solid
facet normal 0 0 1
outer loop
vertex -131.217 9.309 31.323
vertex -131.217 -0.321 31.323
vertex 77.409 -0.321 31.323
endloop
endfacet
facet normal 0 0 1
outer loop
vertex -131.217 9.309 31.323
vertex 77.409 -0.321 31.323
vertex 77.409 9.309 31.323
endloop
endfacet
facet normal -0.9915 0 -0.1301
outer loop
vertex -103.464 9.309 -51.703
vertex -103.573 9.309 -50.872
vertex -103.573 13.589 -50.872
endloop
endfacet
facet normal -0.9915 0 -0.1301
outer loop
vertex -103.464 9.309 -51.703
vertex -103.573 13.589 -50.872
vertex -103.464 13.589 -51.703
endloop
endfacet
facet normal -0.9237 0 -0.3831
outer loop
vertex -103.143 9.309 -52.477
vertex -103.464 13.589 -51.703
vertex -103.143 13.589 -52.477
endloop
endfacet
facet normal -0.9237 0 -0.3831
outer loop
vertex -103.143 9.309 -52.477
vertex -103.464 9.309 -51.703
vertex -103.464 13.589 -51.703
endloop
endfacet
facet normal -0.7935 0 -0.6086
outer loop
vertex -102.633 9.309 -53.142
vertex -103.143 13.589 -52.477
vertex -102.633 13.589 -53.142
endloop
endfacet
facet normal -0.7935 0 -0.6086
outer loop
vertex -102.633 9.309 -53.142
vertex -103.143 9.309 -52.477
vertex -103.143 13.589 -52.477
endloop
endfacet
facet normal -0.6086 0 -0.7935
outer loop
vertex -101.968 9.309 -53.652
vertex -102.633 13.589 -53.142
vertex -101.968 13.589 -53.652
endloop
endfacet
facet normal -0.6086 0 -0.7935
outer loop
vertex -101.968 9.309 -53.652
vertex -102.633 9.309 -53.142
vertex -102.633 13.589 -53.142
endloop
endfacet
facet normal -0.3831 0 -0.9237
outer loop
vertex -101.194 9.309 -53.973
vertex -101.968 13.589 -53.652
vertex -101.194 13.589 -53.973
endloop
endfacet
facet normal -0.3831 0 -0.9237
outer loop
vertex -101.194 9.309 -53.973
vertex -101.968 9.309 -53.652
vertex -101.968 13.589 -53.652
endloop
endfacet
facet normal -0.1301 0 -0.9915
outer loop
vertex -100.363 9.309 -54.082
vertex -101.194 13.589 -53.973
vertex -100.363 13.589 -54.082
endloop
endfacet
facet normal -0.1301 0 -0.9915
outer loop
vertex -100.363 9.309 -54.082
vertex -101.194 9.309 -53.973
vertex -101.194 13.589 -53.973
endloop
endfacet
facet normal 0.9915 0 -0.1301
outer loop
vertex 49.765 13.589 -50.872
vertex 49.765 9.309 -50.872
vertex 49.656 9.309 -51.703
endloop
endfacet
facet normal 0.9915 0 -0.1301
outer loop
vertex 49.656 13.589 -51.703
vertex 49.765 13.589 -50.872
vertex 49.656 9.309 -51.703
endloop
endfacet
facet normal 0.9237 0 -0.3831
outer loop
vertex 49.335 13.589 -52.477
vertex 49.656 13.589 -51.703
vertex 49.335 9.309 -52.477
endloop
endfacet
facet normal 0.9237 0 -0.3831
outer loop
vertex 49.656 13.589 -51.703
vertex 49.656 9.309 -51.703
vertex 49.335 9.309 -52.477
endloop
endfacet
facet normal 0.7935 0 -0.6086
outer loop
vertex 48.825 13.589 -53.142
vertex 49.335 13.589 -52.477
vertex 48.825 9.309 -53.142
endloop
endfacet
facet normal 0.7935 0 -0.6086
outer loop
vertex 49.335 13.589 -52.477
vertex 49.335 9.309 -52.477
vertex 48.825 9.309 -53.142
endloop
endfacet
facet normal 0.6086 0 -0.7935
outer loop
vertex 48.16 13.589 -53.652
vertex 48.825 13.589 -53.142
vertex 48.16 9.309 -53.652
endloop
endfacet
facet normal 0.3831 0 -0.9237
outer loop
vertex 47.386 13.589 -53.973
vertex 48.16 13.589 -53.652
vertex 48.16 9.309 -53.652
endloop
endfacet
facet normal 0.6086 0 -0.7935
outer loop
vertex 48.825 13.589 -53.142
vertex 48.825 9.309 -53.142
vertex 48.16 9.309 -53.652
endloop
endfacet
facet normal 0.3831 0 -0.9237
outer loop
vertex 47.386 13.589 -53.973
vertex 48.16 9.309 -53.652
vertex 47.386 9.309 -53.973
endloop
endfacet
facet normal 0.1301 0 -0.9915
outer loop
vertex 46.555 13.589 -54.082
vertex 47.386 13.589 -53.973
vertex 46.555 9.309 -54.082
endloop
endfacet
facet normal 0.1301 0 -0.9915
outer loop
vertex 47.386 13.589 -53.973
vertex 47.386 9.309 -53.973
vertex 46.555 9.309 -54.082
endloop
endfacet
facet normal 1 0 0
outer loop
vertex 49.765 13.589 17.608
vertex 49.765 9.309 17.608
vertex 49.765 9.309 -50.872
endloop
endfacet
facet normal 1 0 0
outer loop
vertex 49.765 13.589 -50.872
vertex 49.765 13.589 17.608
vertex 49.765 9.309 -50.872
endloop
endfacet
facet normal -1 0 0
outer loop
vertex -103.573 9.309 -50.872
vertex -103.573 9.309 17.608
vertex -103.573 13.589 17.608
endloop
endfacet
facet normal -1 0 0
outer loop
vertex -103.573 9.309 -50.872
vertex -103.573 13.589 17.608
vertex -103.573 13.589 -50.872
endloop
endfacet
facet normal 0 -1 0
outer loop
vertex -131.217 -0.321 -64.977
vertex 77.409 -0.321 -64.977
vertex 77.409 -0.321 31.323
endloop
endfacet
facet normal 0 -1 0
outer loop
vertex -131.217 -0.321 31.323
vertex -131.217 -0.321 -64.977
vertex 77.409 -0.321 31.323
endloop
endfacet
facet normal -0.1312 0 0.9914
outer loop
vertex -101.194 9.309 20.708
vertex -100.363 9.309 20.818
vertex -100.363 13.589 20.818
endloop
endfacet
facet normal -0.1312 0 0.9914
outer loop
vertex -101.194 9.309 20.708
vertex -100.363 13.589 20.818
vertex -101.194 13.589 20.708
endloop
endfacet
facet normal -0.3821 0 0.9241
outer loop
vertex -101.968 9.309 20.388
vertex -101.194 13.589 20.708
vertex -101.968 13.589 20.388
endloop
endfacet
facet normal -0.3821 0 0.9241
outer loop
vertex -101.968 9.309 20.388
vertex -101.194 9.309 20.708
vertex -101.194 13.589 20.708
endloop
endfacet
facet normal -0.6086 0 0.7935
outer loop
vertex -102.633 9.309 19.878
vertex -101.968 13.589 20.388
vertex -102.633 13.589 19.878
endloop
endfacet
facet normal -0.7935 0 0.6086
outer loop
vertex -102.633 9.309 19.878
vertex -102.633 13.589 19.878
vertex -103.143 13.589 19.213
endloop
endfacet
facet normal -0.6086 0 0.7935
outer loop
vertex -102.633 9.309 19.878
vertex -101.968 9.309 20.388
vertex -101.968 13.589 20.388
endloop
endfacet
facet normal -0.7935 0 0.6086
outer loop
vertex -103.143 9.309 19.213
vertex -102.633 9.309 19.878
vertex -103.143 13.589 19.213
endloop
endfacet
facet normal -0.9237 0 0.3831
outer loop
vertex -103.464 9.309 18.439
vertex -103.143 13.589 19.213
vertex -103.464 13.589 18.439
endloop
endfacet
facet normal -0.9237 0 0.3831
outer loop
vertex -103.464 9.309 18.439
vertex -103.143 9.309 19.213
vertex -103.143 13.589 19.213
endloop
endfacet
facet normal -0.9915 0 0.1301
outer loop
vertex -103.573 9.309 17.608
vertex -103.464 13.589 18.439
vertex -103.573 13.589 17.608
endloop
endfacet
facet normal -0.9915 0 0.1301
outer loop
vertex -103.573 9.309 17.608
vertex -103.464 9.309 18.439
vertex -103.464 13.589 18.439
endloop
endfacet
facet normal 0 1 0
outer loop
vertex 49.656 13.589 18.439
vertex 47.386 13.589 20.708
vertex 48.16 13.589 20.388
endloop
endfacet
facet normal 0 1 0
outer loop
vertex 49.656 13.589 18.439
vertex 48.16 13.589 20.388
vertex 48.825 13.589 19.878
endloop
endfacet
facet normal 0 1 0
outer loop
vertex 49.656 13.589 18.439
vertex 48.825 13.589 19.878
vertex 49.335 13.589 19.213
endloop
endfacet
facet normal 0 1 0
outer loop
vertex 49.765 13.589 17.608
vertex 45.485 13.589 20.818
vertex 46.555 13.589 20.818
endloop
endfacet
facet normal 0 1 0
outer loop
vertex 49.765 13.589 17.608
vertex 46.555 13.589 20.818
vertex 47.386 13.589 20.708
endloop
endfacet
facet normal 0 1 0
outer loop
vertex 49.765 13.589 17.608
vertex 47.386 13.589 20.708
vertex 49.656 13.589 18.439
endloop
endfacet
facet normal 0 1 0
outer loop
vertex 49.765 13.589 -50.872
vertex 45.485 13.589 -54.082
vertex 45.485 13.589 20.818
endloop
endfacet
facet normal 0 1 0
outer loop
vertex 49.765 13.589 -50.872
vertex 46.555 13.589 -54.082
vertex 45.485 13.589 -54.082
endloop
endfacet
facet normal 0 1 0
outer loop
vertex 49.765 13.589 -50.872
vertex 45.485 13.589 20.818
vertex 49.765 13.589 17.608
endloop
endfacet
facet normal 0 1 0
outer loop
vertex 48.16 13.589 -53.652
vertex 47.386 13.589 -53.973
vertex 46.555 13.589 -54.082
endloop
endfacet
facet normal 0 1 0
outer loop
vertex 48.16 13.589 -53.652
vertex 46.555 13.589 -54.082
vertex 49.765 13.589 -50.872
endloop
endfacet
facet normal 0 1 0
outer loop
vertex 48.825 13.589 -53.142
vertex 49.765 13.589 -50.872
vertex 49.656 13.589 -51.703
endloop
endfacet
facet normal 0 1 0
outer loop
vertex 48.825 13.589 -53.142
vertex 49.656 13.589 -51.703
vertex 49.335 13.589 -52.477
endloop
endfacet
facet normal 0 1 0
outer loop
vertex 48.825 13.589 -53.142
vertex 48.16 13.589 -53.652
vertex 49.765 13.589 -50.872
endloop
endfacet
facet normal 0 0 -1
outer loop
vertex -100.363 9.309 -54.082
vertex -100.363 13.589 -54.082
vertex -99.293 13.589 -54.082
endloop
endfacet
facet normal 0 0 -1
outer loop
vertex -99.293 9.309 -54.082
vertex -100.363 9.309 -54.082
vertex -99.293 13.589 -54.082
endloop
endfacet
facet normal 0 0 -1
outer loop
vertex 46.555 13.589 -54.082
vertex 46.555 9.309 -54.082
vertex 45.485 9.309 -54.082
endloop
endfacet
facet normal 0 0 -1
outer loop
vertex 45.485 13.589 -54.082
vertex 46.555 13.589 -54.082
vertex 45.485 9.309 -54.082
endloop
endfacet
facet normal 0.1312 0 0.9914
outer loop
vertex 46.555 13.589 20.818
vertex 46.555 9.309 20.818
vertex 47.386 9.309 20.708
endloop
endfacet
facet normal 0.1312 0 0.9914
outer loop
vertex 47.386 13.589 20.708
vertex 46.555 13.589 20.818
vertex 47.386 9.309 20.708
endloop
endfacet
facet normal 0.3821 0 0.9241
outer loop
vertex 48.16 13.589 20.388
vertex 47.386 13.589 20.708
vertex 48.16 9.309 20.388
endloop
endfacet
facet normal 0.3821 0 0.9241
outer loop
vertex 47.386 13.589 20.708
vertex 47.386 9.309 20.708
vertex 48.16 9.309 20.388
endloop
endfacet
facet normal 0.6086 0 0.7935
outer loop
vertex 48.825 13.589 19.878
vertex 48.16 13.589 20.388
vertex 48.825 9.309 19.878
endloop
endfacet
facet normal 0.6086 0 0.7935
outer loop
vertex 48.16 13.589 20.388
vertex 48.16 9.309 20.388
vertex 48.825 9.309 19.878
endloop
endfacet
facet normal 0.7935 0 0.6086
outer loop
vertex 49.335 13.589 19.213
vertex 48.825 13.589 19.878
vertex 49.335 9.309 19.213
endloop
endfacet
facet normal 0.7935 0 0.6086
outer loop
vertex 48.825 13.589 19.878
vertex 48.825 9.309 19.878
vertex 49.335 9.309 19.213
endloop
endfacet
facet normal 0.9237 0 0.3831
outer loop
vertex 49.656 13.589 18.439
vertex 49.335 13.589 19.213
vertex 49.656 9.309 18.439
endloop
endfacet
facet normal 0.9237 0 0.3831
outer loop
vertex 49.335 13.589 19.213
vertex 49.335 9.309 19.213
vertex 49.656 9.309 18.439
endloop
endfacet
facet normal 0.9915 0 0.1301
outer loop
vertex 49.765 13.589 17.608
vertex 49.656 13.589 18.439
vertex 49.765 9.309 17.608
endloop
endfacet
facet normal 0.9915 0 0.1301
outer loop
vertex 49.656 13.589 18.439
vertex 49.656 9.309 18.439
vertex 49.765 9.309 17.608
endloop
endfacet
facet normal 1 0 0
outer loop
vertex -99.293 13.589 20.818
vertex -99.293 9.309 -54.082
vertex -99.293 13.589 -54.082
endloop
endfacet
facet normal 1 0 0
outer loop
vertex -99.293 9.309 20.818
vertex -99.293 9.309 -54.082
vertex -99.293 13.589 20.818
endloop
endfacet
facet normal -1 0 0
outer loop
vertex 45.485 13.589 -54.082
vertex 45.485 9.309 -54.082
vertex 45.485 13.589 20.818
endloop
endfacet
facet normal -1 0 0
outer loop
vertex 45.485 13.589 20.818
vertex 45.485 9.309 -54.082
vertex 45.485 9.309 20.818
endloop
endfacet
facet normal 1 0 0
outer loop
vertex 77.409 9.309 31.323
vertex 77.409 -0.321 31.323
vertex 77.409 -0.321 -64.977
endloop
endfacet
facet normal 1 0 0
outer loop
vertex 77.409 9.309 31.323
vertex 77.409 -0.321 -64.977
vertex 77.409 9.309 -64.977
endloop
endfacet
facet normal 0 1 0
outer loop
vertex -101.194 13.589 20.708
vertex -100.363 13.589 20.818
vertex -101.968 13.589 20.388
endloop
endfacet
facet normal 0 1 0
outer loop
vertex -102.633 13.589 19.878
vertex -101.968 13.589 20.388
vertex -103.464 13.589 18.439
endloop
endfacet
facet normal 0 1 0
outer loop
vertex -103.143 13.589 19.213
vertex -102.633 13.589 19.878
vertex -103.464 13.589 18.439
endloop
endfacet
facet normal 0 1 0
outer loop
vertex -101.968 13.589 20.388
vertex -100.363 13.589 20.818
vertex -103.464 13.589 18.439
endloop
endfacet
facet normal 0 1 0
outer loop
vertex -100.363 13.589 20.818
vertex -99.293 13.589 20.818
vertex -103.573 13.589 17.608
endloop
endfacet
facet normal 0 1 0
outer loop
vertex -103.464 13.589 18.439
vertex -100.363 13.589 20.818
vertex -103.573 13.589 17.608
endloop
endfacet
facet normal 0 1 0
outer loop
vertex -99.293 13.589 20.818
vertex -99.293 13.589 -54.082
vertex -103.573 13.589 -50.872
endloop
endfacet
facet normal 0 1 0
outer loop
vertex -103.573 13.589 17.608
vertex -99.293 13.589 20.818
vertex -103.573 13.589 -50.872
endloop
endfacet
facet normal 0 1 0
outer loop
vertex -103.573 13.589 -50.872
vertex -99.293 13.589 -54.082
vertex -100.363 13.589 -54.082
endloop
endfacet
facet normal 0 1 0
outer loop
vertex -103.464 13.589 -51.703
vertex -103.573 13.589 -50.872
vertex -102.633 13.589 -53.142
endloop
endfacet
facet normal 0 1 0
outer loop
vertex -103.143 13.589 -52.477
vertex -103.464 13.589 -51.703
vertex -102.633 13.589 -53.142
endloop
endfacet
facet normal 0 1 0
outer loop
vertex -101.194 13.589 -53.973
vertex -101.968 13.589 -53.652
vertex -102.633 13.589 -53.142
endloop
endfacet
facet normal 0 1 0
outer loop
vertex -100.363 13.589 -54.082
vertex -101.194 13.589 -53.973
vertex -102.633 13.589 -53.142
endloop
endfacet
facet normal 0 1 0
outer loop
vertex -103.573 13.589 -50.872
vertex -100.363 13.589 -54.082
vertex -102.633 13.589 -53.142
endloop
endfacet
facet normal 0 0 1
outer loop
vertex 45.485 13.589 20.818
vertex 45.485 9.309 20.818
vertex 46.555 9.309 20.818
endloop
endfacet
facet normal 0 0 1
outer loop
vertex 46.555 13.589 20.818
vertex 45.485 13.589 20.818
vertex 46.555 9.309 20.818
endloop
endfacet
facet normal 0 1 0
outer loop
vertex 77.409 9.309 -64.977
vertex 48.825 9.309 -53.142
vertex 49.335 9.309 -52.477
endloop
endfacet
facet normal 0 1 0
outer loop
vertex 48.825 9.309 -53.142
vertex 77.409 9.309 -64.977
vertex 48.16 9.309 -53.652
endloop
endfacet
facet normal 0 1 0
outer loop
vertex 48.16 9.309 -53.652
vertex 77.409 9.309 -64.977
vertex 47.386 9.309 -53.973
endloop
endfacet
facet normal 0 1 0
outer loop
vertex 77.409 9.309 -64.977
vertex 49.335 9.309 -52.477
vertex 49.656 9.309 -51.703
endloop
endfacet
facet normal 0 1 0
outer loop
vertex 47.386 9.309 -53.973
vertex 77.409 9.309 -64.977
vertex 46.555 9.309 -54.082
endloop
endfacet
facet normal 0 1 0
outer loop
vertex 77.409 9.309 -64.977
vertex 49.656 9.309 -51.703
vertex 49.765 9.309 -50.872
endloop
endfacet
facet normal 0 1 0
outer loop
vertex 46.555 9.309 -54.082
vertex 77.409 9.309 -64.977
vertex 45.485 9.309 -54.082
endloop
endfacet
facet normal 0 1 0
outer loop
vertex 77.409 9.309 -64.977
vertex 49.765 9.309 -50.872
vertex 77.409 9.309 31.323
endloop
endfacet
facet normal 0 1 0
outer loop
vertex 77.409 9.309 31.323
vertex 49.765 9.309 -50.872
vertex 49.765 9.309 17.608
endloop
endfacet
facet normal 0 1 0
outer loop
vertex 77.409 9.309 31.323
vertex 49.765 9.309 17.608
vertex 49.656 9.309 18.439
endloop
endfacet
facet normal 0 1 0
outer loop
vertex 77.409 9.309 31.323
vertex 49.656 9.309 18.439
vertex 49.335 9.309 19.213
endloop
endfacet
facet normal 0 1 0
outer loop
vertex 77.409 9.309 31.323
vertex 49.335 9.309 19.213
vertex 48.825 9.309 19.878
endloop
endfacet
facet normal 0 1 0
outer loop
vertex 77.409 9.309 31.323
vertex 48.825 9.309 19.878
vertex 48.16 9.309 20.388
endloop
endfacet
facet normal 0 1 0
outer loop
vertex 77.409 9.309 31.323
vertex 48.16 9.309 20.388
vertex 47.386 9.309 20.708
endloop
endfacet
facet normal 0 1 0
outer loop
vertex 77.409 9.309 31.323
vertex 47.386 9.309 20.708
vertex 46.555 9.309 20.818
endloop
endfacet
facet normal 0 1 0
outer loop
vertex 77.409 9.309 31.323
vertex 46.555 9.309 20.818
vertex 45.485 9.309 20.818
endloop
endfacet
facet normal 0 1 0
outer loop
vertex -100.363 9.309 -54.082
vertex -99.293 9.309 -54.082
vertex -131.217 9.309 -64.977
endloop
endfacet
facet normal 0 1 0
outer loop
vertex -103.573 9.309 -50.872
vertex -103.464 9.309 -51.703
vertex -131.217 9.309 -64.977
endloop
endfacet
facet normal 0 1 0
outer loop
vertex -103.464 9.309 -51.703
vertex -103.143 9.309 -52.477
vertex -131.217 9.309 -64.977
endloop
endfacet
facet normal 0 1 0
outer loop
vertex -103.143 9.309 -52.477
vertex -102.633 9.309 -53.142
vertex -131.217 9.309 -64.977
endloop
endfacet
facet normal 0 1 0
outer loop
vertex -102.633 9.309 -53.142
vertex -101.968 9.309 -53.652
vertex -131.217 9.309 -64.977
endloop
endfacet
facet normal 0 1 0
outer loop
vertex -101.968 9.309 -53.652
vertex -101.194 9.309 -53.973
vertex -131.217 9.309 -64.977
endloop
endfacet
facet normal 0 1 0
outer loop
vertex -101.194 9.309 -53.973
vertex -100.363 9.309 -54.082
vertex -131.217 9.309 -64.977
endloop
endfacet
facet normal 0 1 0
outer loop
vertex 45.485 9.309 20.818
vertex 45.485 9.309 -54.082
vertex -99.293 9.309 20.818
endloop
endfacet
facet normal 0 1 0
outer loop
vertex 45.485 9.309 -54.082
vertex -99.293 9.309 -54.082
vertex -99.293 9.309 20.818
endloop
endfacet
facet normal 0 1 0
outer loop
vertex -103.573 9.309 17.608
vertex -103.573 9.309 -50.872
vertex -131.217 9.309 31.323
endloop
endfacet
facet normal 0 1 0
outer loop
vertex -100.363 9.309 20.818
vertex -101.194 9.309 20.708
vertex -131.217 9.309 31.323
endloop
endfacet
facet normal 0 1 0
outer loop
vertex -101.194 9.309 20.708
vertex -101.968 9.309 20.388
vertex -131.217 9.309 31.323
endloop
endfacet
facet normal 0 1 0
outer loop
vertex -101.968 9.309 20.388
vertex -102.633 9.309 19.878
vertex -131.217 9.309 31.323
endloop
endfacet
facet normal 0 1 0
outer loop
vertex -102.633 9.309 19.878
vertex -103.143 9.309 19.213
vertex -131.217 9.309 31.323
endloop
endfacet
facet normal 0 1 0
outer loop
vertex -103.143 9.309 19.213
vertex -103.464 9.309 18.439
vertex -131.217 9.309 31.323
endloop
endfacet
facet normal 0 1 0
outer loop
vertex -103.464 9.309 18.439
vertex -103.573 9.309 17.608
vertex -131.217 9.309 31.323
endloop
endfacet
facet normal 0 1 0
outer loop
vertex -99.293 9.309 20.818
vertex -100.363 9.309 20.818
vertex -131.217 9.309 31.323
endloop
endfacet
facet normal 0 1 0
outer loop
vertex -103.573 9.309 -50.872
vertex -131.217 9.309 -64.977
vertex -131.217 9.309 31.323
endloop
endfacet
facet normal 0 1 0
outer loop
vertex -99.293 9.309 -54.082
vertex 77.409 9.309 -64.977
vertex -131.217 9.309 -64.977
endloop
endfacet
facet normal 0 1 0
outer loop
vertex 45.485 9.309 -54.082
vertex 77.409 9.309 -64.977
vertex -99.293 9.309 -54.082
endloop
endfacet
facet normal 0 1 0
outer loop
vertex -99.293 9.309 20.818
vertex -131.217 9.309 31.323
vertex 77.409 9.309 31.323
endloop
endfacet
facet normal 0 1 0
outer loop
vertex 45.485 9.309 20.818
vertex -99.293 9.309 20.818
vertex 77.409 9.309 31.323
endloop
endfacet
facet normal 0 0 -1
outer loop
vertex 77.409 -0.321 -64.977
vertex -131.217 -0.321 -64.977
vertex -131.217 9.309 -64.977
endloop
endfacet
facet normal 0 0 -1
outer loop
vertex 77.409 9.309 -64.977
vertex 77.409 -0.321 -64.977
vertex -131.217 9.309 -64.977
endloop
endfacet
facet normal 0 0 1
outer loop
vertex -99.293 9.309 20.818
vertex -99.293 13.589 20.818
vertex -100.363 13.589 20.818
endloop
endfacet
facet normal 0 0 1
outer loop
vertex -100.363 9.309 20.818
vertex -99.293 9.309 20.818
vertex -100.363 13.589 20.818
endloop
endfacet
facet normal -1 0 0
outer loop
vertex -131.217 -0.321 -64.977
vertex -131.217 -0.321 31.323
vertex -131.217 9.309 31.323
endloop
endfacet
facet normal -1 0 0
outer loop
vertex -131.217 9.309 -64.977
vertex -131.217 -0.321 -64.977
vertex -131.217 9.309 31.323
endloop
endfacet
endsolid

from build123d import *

# Parameters (mm, degrees)
ESQUISSE1_W                 = 160
ESQUISSE1_H                 = 90
T_LE_DE_BASE_PLI_E1_DEPTH   = 9
T_LE_PLI_E_SUR_AR_TE1_DEPTH = 90
T_LE_PLI_E_SUR_AR_TE2_DEPTH = 90
EXTRUSION1_DEPTH            = 4
ETAT_START                  = -116.640587823
ETAT_D_PLI_1_OUTLINE_W      = 10
ETAT_D_PLI_1_OUTLINE_H      = 90
ETAT_D_PLI_1_DEPTH          = 179.4732
ETAT_START_2                = -124.393019868
ETAT_D_PLI_1_2_OUTLINE_W    = 9
ETAT_D_PLI_1_2_OUTLINE_H    = 90
ETAT_D_PLI_1_2_DEPTH        = 194.978064089
ECHELLE1_SCALE              = 1.07


# Read off the part's stored shape, not the designer's step: Etat déplié1
# Sheet-metal steps are written as plain solids
with BuildPart() as part:
    # Esquisse1 → Tôle de base pliée1 (new body)
    with BuildSketch(Plane(origin=(0, 0, 0), x_dir=(1, 0, 0), z_dir=(0, 1, 0))):
        with Locations((-26.903987823, 16.826605784)):
            Rectangle(ESQUISSE1_W, ESQUISSE1_H)
    extrude(amount=T_LE_DE_BASE_PLI_E1_DEPTH)

    # Tôle pliée sur arête1 section (across the edge) → Tôle pliée sur arête1 (add)
    with BuildSketch(Plane(origin=(53.832612177, 0, -61.826605784), x_dir=(-1, 0, 0), z_dir=(0, 0, 1))):
        with BuildLine():
            Line((-9, 0.7366), (-9, 10))
            Line((-9, 10), (0, 10))
            Line((0, 10), (0, 0.7366))
            ThreePointArc((0, 0.7366), (0.215745145, 0.215745145), (0.7366, 0))
            Line((0.7366, 0), (0.7366, -9))
            ThreePointArc((0.7366, -9), (-6.148215886, -6.148215886), (-9, 0.7366))
        make_face()
    extrude(amount=T_LE_PLI_E_SUR_AR_TE1_DEPTH)

    # Tôle pliée sur arête2 section (across the edge) → Tôle pliée sur arête2 (add)
    with BuildSketch(Plane(origin=(-107.640587823, 0, 28.173394216), x_dir=(1, 0, 0), z_dir=(0, 0, -1))):
        with BuildLine():
            Line((-9, 0.7366), (-9, 10))
            Line((-9, 10), (0, 10))
            Line((0, 10), (0, 0.7366))
            ThreePointArc((0, 0.7366), (0.215745145, 0.215745145), (0.7366, 0))
            Line((0.7366, 0), (0.7366, -9))
            ThreePointArc((0.7366, -9), (-6.148215886, -6.148215886), (-9, 0.7366))
        make_face()
    extrude(amount=T_LE_PLI_E_SUR_AR_TE2_DEPTH)

    # Esquisse9 → Extrusion1 (add)
    with BuildSketch(Plane(origin=(0, 9, 0), x_dir=(1, 0, 0), z_dir=(0, 1, 0))):
        with BuildLine():
            Line((-95.557213934, 51.644704016), (-94.557213934, 51.644704016))
            Line((-94.557213934, 51.644704016), (-94.557213934, -18.355295984))
            Line((-94.557213934, -18.355295984), (-95.557213934, -18.355295984))
            ThreePointArc((-95.557213934, -18.355295984), (-97.678534277, -17.476616327), (-98.557213934, -15.355295984))
            Line((-98.557213934, -15.355295984), (-98.557213934, 48.644704016))
            ThreePointArc((-98.557213934, 48.644704016), (-97.678534277, 50.76602436), (-95.557213934, 51.644704016))
        make_face()
        with BuildLine():
            Line((40.749238287, 51.644704016), (40.749238287, -18.355295984))
            Line((40.749238287, -18.355295984), (41.749238287, -18.355295984))
            ThreePointArc((41.749238287, -18.355295984), (43.870558631, -17.476616327), (44.749238287, -15.355295984))
            Line((44.749238287, -15.355295984), (44.749238287, 48.644704016))
            ThreePointArc((44.749238287, 48.644704016), (43.870558631, 50.76602436), (41.749238287, 51.644704016))
            Line((41.749238287, 51.644704016), (40.749238287, 51.644704016))
        make_face()
    extrude(amount=EXTRUSION1_DEPTH)

    # Etat déplié1 outline → Etat déplié1 (cut)
    with BuildSketch(Plane.YZ.offset(ETAT_START)):
        with Locations((-5, -16.826605784)):
            Rectangle(ETAT_D_PLI_1_OUTLINE_W, ETAT_D_PLI_1_OUTLINE_H)
    extrude(amount=ETAT_D_PLI_1_DEPTH, mode=Mode.SUBTRACT)

    # Etat d_pli_1 2 outline → Etat d_pli_1 2 (add)
    with BuildSketch(Plane.YZ.offset(ETAT_START_2)):
        with Locations((4.5, -16.826605784)):
            Rectangle(ETAT_D_PLI_1_2_OUTLINE_W, ETAT_D_PLI_1_2_OUTLINE_H)
    extrude(amount=ETAT_D_PLI_1_2_DEPTH)


with BuildPart() as part_1:
    # Echelle1: scaled about (-26.903987823, 4.589665377, -16.824096508)
    add(part.part.scale(ECHELLE1_SCALE).moved(Location((1.883279148, -0.321276576, 1.177686756))))


solid = part_1.part
